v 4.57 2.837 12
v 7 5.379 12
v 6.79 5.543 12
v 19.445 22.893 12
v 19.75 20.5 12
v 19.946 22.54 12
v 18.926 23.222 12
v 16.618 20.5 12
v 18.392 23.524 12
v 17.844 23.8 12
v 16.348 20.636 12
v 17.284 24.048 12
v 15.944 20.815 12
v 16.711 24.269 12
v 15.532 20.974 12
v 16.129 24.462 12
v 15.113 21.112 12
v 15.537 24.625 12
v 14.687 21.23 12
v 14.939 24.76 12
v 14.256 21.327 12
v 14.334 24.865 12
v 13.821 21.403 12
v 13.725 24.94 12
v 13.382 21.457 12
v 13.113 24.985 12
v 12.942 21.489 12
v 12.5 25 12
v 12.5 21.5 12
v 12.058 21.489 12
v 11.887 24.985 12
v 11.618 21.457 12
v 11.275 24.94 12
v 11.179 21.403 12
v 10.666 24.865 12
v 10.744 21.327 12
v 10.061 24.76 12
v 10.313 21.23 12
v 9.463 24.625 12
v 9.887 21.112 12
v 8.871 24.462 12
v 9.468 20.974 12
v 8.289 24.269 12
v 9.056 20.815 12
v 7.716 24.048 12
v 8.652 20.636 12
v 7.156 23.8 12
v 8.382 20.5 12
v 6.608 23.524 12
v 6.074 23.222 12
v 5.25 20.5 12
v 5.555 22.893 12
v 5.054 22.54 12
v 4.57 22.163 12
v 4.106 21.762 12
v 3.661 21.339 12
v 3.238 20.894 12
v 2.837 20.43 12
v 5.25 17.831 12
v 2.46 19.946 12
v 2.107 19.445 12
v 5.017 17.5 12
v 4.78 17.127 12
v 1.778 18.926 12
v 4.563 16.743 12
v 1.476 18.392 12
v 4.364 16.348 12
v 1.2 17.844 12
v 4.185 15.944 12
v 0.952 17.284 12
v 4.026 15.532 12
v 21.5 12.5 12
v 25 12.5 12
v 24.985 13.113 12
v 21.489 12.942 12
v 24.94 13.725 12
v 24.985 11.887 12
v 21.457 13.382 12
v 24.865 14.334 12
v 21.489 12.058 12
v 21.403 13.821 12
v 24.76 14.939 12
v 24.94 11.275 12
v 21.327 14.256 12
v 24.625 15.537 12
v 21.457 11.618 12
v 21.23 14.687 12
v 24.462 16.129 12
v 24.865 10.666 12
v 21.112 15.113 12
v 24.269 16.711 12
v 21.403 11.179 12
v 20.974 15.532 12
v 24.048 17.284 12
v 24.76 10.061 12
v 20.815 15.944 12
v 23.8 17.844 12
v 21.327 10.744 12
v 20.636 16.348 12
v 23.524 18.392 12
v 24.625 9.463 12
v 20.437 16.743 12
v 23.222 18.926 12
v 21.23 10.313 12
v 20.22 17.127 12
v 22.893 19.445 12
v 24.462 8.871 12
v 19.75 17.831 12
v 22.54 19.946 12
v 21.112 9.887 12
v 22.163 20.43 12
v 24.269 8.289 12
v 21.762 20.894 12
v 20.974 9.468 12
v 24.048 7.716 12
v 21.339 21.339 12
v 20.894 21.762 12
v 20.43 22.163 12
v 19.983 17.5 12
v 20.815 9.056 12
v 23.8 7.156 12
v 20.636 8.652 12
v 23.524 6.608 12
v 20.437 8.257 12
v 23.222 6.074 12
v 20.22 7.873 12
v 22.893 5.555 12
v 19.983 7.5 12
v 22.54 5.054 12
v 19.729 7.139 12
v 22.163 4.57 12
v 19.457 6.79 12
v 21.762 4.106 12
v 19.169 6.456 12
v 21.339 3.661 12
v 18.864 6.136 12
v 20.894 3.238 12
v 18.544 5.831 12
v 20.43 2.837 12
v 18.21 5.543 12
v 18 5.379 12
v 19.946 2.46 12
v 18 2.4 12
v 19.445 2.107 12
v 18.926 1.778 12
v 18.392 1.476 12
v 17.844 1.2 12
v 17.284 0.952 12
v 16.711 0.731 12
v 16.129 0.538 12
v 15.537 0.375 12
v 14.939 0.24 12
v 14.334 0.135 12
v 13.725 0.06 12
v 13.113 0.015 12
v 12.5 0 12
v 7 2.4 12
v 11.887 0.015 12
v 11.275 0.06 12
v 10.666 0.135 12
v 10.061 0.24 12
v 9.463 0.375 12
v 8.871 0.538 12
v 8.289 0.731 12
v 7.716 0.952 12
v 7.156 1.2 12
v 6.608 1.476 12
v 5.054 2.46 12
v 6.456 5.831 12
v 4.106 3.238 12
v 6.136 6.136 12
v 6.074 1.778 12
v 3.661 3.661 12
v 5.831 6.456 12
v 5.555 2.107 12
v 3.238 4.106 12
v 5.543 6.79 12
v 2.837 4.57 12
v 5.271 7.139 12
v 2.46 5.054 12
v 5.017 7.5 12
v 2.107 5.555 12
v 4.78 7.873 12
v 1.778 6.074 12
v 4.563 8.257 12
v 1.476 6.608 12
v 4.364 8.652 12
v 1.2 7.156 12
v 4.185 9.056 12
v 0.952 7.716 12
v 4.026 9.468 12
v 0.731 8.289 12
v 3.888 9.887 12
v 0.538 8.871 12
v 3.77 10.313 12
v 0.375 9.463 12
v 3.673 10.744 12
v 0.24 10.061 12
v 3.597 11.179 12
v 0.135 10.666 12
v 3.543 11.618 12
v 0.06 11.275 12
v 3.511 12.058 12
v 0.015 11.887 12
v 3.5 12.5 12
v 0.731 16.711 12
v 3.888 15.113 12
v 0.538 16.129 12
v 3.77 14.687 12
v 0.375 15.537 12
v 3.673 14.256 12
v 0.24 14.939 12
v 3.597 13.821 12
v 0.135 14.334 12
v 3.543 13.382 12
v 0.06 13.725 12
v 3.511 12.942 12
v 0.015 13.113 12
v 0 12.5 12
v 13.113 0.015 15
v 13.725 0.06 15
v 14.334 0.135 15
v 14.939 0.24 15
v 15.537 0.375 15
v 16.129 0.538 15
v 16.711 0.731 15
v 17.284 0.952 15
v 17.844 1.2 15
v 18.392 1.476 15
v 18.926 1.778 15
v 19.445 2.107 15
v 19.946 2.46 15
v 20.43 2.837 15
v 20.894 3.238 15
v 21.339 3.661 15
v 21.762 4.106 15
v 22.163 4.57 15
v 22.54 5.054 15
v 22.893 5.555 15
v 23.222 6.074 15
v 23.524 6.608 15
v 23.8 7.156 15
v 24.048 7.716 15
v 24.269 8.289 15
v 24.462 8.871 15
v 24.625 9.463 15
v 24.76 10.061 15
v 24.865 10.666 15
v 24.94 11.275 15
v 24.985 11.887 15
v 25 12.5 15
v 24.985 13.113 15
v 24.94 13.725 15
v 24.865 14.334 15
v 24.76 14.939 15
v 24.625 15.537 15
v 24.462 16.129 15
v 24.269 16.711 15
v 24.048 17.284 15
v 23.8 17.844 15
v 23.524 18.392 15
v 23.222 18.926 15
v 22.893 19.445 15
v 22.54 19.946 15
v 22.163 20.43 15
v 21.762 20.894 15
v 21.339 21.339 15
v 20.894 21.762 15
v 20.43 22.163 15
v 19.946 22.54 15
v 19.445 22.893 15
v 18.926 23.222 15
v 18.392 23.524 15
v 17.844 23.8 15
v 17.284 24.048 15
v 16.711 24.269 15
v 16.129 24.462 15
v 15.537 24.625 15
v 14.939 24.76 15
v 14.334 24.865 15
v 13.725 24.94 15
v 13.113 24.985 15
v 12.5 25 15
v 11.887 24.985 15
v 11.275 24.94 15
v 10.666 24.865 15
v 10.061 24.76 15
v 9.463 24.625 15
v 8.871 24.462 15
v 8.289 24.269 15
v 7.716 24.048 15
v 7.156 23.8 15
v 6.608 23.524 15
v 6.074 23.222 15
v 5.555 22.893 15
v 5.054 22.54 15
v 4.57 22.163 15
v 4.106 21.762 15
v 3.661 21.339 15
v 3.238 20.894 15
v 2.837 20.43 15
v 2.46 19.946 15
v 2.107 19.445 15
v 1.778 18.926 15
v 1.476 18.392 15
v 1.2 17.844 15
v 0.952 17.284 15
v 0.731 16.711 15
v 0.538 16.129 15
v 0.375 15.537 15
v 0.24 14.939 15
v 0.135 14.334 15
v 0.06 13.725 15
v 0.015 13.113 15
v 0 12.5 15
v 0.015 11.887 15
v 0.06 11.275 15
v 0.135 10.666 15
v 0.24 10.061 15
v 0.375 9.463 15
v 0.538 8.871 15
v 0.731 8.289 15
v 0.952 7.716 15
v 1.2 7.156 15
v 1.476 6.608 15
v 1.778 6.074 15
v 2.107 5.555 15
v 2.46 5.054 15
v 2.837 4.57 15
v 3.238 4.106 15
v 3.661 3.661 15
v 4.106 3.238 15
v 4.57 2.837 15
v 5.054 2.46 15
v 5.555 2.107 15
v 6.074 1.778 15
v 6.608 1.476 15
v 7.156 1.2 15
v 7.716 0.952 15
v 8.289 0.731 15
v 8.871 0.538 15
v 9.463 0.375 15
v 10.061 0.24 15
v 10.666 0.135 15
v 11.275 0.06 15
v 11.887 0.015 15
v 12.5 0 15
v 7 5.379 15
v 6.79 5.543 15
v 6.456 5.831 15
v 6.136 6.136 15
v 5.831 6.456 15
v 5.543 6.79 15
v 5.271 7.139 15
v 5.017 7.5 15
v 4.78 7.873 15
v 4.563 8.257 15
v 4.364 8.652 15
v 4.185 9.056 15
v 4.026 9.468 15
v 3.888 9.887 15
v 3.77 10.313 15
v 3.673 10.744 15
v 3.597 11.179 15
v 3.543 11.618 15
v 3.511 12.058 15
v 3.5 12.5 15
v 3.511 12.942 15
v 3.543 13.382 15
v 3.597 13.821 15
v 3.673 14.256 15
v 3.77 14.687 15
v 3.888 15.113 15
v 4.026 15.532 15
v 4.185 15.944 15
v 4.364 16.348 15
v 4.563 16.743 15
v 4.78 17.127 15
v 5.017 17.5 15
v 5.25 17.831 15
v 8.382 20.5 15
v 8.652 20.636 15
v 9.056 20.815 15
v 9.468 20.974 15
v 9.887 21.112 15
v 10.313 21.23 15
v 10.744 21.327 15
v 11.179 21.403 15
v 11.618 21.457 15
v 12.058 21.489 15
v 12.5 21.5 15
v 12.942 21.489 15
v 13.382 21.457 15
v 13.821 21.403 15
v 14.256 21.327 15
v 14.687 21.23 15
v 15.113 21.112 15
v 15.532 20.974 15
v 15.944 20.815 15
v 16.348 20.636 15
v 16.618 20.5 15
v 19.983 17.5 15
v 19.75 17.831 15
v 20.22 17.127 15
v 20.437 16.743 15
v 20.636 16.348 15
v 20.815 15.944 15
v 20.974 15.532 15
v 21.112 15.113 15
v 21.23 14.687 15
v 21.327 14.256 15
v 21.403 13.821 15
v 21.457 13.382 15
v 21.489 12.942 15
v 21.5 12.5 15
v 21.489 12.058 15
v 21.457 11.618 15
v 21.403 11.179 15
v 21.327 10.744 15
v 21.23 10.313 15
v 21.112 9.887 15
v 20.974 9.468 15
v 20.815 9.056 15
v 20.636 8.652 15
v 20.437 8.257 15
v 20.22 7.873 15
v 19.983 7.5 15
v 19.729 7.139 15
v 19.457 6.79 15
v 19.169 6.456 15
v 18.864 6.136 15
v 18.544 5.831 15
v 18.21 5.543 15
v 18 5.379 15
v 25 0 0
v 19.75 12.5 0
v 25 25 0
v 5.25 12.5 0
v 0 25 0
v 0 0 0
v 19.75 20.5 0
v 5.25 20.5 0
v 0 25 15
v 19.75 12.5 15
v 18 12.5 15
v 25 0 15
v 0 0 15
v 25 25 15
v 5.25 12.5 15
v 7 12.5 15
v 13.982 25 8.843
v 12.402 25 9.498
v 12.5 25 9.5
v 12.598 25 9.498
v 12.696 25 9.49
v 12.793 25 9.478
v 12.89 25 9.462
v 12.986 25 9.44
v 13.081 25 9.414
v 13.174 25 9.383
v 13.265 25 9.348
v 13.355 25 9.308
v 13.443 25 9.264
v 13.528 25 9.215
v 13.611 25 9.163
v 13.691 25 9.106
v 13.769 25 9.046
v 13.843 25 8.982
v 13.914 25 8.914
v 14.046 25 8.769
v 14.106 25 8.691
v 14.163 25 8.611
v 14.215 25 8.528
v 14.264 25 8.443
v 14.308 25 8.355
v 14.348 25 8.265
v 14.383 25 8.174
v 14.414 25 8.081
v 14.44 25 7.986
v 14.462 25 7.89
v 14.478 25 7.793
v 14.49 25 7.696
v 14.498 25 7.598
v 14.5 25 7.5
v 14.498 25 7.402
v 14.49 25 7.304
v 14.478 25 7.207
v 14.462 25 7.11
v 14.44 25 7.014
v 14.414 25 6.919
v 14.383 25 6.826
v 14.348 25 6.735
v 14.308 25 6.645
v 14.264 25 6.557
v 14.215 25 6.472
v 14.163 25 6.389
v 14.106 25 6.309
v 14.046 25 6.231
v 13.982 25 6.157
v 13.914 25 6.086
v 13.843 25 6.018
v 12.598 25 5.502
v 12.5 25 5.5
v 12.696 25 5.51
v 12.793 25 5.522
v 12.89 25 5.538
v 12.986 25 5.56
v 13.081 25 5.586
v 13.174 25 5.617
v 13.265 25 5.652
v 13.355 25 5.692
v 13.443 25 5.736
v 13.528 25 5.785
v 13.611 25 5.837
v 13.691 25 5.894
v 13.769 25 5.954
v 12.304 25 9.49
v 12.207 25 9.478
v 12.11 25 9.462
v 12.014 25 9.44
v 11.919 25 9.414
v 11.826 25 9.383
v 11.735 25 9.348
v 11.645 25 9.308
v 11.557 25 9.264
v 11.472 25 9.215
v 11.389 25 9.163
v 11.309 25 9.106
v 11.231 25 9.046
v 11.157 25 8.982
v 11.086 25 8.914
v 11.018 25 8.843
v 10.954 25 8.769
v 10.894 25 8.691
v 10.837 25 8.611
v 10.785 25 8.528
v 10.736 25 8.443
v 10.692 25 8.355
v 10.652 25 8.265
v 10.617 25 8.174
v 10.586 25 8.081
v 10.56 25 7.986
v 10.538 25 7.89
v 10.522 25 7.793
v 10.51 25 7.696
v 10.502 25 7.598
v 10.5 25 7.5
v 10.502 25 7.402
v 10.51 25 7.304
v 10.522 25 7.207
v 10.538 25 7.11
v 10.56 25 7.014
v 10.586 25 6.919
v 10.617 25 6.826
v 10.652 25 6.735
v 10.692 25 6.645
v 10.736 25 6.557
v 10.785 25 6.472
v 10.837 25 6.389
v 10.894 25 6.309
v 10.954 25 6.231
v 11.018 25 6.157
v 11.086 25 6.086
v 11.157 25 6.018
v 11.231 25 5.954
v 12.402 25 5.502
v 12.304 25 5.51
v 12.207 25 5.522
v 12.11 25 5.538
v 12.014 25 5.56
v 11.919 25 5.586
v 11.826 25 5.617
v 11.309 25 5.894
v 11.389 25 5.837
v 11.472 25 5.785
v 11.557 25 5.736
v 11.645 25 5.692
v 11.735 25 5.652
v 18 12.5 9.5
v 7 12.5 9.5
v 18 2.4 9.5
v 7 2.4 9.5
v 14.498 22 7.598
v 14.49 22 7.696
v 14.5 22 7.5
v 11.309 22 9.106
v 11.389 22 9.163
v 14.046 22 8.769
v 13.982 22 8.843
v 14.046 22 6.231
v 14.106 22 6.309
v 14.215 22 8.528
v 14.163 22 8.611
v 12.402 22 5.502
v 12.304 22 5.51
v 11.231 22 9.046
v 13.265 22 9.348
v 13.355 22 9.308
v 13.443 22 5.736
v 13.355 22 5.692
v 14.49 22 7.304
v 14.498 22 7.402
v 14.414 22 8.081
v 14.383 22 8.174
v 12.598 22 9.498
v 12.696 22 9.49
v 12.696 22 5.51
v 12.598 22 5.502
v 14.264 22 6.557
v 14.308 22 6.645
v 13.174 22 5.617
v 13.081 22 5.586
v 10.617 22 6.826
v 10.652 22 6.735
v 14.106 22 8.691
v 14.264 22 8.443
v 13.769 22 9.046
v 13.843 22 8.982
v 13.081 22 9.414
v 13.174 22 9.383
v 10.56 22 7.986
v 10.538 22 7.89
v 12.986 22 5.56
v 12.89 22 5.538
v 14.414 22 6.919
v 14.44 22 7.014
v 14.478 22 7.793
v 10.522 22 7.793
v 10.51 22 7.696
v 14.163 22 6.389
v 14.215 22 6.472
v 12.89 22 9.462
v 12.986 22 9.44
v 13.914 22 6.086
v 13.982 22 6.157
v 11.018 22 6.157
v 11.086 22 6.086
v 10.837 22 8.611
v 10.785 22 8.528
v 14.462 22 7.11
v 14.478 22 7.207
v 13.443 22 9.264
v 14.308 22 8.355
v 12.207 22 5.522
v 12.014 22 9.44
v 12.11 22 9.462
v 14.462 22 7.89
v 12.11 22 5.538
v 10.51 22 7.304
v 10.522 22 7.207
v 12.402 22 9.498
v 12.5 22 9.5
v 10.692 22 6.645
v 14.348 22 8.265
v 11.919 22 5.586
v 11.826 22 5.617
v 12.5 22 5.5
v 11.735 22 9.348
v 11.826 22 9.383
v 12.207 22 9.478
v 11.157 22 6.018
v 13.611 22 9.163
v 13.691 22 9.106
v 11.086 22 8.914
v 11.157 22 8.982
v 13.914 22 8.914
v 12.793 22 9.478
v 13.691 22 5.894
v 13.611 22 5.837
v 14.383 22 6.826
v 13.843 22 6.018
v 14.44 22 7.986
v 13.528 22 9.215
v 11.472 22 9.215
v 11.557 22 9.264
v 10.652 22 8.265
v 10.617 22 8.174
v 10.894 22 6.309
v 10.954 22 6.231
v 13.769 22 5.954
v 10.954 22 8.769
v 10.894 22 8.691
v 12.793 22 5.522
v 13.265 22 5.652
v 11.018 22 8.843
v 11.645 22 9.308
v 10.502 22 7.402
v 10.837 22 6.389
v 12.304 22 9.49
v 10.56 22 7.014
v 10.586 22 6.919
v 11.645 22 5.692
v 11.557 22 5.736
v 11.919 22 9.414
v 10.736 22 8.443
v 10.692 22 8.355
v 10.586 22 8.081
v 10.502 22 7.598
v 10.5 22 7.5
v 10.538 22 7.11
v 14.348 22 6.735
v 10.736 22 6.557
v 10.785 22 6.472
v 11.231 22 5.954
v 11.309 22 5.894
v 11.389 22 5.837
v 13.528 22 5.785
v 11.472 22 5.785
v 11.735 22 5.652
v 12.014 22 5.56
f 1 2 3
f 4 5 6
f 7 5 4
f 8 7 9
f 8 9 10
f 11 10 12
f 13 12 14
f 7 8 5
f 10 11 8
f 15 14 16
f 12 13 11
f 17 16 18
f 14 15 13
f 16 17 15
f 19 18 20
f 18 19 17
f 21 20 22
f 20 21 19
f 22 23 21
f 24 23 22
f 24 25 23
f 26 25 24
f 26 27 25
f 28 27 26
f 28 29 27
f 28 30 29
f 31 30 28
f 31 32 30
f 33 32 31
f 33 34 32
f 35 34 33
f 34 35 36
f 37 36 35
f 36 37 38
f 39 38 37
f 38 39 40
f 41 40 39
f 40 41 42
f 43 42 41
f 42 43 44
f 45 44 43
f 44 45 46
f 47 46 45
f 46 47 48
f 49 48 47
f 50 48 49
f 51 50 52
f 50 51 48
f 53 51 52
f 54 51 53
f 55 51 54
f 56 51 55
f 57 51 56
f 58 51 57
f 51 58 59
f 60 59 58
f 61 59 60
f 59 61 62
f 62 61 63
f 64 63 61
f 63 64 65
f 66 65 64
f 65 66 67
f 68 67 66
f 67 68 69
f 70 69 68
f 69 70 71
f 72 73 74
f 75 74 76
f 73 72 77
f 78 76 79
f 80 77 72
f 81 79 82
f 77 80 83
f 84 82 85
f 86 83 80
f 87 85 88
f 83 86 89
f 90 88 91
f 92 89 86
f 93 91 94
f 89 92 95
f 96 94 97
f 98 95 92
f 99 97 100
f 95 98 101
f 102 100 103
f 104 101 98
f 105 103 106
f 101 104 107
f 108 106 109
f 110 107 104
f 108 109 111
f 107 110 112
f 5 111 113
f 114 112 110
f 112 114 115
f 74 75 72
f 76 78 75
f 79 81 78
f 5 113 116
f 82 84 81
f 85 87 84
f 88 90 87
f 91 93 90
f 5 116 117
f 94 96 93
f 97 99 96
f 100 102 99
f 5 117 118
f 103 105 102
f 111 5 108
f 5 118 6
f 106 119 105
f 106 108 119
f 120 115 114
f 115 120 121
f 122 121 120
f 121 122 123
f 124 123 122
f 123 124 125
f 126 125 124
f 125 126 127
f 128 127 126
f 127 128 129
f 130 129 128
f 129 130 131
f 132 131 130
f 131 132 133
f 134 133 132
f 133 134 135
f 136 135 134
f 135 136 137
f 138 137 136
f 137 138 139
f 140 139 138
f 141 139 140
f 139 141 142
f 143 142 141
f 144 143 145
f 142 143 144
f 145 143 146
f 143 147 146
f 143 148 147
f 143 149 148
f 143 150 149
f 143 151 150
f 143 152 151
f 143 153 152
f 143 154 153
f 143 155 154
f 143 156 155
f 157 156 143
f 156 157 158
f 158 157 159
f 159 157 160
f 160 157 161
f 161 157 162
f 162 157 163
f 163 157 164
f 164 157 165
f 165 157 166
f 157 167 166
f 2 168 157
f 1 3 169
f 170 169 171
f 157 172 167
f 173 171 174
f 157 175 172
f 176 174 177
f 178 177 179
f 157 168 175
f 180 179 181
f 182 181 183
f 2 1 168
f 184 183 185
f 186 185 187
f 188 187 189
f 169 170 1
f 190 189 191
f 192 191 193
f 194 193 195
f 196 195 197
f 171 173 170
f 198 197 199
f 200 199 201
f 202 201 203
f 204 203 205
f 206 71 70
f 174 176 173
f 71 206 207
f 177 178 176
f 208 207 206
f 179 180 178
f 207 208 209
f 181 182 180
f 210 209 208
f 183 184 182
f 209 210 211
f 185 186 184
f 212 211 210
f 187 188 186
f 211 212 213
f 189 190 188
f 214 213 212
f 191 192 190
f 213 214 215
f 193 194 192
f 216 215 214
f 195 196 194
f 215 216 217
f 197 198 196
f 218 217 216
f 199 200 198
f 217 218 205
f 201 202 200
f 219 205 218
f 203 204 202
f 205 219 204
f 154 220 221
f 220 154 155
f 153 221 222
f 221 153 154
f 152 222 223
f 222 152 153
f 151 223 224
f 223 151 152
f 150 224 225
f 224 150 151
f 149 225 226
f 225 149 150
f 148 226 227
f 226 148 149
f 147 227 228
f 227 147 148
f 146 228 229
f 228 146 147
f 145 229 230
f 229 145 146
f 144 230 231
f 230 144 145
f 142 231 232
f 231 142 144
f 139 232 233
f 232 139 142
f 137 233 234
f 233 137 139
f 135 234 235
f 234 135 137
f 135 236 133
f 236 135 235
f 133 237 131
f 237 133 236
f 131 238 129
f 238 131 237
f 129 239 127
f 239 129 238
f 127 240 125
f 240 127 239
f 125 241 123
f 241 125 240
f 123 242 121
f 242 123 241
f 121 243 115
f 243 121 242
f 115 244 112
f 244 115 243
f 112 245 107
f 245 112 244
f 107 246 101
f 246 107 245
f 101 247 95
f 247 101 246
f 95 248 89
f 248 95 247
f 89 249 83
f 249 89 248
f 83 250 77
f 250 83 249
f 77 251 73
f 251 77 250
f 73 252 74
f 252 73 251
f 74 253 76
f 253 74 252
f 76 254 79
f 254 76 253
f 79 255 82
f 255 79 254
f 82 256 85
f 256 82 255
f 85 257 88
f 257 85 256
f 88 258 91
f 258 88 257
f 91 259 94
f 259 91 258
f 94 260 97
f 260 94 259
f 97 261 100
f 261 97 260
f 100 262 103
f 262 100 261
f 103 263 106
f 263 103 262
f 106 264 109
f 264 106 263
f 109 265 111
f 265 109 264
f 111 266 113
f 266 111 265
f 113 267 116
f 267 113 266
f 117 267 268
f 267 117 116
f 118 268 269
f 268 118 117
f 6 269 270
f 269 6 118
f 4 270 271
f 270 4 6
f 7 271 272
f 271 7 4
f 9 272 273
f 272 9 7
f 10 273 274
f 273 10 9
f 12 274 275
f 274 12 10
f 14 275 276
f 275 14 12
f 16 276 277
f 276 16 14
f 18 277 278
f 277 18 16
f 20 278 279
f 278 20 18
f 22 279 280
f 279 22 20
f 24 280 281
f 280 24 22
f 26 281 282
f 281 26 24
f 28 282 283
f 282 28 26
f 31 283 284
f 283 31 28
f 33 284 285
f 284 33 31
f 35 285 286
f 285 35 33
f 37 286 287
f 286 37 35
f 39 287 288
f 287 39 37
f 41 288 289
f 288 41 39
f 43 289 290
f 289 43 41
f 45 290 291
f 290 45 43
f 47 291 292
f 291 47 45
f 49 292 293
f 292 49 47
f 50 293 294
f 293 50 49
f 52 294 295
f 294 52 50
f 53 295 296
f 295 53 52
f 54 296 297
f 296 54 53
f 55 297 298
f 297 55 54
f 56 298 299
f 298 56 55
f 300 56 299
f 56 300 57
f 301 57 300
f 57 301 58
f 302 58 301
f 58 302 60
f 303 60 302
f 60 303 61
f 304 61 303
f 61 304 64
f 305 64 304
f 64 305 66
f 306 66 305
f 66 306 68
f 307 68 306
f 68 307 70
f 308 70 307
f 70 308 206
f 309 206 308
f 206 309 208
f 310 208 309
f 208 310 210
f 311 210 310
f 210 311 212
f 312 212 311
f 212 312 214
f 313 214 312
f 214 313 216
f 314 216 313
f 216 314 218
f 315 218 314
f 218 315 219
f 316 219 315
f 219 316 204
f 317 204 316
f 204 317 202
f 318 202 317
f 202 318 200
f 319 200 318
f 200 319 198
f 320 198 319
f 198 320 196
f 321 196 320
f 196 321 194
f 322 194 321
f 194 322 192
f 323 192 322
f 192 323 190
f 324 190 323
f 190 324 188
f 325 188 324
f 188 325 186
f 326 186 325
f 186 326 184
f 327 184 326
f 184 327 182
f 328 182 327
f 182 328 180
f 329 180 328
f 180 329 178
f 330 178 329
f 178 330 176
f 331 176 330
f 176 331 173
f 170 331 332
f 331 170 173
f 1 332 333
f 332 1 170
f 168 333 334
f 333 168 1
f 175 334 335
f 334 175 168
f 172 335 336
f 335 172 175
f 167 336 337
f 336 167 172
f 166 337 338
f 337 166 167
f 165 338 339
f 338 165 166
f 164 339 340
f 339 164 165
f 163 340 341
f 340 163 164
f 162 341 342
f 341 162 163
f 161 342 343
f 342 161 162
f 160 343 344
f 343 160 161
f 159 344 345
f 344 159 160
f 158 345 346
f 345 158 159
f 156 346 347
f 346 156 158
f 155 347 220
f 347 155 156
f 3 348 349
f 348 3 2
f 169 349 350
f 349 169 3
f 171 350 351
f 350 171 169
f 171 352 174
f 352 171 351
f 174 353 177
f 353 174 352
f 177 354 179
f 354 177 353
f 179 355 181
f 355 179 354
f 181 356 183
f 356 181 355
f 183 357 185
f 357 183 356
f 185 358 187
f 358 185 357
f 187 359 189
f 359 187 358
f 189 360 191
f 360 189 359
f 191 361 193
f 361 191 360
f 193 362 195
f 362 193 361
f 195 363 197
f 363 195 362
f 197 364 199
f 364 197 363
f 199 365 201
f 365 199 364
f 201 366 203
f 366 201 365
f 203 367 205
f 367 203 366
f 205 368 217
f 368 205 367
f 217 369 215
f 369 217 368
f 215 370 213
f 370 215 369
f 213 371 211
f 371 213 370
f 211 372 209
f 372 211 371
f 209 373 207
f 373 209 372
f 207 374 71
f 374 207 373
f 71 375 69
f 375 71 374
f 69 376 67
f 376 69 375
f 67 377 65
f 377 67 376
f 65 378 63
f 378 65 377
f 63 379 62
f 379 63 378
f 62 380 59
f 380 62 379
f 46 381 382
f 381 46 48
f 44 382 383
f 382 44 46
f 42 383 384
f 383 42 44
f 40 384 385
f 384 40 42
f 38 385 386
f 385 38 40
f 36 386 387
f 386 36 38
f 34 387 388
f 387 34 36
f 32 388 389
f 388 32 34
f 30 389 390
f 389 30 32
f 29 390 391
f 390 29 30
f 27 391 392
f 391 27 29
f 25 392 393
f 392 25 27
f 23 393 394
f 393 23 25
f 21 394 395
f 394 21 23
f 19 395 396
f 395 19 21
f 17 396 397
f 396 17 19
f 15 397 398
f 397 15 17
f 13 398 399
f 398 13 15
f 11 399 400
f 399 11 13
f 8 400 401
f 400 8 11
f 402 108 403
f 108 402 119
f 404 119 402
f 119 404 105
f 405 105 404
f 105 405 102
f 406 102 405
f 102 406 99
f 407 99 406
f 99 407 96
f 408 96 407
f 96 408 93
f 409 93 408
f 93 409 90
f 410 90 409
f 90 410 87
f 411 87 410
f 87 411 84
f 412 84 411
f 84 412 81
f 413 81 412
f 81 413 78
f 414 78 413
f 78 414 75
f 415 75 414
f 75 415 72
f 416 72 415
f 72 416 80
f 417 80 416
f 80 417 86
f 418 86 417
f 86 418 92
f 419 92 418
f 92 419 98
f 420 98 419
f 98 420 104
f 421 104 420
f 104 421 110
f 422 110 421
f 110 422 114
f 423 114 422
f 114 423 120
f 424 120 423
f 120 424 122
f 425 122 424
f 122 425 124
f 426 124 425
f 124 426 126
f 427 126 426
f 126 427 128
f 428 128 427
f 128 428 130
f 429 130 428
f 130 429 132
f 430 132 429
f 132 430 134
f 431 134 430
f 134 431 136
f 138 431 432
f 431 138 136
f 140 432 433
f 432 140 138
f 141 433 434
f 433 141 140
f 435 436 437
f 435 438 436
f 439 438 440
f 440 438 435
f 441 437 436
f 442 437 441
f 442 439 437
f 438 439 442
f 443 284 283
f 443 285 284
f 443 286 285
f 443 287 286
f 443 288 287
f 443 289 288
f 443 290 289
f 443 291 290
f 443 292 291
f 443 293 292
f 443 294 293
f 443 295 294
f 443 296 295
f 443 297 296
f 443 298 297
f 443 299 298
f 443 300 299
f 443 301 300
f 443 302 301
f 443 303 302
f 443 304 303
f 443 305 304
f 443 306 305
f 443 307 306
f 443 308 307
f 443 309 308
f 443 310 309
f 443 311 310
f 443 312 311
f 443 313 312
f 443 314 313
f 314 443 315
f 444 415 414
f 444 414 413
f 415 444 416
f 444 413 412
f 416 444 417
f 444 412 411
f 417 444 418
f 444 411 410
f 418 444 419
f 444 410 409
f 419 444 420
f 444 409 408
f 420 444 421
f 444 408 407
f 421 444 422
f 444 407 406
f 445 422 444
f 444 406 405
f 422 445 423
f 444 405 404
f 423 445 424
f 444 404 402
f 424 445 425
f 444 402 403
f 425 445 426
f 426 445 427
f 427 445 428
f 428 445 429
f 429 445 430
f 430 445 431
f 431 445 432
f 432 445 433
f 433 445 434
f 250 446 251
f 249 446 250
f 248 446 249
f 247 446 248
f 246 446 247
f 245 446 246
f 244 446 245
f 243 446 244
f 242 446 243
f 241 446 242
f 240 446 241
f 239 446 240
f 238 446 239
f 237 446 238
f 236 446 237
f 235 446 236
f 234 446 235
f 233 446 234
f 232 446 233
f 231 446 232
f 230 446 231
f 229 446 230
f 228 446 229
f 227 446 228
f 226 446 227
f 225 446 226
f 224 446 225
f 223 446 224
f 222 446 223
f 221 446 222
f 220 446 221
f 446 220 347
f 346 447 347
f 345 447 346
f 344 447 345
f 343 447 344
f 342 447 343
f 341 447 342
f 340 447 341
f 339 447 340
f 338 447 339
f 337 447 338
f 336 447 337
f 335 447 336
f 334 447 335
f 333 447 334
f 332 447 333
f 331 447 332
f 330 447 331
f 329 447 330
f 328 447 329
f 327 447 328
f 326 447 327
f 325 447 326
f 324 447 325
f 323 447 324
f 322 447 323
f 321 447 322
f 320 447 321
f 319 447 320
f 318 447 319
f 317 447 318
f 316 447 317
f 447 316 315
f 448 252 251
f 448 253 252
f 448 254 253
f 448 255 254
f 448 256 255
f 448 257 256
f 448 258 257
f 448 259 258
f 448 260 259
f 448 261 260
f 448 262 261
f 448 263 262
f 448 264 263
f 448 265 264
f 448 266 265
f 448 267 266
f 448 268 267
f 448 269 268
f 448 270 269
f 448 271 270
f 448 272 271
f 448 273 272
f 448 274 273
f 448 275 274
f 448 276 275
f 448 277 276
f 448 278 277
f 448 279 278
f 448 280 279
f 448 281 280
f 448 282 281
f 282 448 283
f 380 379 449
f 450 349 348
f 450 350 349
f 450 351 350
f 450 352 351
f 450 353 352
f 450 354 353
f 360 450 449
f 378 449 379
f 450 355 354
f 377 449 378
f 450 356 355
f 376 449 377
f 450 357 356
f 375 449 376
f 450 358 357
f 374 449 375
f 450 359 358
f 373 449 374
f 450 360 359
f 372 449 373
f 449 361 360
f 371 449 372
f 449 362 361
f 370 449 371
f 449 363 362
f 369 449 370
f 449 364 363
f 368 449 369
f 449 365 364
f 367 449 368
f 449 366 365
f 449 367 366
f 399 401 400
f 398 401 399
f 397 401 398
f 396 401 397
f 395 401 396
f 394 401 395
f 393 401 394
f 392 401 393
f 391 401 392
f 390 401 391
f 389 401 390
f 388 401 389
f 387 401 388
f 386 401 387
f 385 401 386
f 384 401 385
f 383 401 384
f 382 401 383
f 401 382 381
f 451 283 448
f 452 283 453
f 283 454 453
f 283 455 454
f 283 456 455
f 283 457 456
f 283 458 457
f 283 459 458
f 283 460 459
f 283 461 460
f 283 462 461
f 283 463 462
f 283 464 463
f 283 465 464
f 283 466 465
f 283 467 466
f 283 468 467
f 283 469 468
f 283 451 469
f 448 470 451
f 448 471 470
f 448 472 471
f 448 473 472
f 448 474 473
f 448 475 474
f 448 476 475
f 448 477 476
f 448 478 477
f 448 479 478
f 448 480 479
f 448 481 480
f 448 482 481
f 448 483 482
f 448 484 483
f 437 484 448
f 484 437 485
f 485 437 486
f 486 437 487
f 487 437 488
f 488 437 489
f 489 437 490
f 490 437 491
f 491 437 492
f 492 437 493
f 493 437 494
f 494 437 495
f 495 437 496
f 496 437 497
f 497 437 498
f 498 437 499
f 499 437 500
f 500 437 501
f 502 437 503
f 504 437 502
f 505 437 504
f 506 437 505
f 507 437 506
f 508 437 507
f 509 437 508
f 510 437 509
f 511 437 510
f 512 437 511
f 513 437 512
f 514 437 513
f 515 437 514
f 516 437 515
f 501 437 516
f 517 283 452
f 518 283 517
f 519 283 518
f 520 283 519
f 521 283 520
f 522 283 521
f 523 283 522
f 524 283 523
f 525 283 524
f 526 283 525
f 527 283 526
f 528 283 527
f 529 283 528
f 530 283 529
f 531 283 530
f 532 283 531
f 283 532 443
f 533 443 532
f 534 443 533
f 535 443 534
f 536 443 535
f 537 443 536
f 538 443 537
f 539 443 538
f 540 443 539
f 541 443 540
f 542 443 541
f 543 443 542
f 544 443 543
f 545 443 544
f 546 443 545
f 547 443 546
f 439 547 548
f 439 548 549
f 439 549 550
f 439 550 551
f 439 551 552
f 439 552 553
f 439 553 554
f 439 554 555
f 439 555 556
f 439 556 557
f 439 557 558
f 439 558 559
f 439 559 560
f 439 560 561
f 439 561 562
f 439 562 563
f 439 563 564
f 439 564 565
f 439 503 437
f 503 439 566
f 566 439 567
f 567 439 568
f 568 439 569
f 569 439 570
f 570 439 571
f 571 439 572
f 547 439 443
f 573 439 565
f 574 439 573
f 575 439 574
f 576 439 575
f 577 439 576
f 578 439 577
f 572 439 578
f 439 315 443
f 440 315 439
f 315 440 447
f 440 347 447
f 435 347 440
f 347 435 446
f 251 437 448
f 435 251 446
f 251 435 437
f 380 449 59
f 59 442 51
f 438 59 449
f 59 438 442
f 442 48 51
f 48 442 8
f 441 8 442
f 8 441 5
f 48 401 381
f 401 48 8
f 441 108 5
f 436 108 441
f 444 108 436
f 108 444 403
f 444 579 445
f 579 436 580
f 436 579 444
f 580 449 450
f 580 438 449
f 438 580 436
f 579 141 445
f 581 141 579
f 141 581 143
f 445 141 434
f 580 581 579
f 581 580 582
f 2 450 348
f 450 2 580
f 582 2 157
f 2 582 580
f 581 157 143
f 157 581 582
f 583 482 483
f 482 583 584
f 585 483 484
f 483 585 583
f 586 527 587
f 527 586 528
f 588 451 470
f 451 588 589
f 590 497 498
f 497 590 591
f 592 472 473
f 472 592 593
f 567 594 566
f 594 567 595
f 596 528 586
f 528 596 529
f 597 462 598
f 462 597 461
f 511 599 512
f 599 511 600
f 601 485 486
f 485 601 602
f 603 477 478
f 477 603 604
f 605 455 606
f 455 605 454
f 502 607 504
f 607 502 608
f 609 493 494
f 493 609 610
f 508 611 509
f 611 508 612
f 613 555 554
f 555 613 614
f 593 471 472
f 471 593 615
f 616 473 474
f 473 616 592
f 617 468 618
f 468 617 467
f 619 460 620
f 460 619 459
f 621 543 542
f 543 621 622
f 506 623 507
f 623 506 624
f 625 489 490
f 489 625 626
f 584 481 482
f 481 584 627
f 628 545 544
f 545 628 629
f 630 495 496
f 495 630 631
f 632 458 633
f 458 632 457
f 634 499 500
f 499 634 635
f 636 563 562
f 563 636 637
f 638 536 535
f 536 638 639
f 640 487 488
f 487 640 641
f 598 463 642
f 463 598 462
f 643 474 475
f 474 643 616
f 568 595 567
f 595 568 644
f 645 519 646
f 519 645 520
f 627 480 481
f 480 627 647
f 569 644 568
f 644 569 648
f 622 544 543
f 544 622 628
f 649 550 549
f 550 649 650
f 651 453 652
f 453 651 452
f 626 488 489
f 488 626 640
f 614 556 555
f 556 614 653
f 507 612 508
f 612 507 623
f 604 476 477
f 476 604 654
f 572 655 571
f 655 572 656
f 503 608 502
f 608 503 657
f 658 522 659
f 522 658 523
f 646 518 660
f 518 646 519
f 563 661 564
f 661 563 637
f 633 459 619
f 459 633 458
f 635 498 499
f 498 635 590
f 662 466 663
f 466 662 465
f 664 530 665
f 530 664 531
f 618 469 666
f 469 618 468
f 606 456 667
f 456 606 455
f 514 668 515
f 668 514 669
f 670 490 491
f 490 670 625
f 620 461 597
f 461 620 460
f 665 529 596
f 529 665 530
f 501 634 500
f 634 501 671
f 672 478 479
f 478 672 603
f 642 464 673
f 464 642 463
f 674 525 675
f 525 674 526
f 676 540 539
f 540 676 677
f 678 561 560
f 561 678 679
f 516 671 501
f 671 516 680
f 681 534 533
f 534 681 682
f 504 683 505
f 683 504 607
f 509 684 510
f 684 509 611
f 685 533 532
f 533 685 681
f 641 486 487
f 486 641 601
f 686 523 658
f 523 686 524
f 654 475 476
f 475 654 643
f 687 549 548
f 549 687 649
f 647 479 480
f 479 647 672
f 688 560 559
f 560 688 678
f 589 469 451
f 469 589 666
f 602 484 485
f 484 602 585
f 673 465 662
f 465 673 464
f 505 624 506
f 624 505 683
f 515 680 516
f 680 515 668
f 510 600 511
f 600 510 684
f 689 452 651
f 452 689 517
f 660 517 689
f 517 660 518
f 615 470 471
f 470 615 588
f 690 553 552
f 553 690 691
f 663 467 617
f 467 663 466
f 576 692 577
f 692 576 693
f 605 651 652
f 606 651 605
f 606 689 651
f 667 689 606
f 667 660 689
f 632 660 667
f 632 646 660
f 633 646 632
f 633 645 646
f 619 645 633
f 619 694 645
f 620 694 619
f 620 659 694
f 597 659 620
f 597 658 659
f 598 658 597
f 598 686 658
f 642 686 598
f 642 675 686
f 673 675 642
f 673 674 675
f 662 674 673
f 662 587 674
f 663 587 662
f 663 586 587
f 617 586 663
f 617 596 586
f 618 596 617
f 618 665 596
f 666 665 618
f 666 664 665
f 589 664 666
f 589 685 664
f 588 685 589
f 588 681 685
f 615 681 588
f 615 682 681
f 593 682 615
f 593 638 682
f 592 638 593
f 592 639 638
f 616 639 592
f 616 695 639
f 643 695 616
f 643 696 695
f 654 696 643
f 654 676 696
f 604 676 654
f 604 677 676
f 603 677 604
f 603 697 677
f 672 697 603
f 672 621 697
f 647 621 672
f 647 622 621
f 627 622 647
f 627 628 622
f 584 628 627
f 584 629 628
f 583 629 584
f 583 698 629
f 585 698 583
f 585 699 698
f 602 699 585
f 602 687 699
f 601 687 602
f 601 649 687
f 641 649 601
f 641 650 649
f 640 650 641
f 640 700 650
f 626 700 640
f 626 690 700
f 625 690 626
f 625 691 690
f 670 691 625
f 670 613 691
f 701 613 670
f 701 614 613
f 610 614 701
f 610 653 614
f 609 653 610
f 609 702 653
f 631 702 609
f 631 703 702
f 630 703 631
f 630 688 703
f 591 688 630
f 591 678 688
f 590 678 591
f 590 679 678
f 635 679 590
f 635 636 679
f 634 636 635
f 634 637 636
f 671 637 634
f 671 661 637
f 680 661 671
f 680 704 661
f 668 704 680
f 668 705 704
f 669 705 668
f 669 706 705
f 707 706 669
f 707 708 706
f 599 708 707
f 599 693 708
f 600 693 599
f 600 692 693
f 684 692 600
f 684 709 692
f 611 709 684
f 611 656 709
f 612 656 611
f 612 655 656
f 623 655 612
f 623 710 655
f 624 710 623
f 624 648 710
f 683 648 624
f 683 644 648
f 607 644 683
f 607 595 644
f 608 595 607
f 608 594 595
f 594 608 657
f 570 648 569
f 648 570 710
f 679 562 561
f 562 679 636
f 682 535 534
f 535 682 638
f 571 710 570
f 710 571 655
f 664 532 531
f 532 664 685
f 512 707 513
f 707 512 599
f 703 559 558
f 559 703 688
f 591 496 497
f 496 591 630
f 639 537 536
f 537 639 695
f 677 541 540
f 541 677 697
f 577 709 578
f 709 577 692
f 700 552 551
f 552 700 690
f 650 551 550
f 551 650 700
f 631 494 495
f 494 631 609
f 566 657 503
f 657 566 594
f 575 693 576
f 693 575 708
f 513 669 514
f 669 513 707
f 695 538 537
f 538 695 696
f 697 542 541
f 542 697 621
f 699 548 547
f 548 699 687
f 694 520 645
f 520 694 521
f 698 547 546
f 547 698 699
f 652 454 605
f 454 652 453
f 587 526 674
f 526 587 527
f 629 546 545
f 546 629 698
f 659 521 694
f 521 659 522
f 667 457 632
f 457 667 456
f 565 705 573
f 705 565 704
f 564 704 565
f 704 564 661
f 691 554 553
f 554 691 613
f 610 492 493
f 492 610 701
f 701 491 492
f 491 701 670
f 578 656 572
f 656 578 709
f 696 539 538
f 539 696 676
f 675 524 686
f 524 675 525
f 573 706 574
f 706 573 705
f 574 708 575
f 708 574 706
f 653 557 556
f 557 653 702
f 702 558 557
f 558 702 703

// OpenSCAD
// file: pinhole_insert.scad
include <config.scad>
module pinhole_insert() {
    difference() {
        linear_extrude(pinhole_insert_height) difference() {
            circle(radius_pinhole);
            circle(radius_pinhole - pinhole_insert_thickness);
        }
        
        translate([radius_pinhole - pinhole_insert_thickness * 1.5, 0, pinhole_insert_height / 2]) rotate([0, 90, 0])
            cylinder(pinhole_insert_thickness * 2, 2, 2);
    }
}

pinhole_insert();
// file: config.scad
$fn = 128;


module hexagon(width) {
	diagonal = width * tan(30) + (width / 2) / cos(30);
	polygon(points = [
		[0, diagonal / 2],
		[width / 2,  width * tan(30) / 2],
		[width / 2, -width * tan(30) / 2],
		[0, -diagonal / 2],
		[-width / 2, -width * tan(30) / 2],
		[-width / 2,  width * tan(30) / 2],
	]);
}

switch_width = 14.5;
switch_height = 8;

bolt_hole_radius = 2.05;

bolt_hex_width = 8.3;
bolt_hex_length = 20;
bolt_mount_thickness = 3; 
bolt_mount_width = bolt_hex_width + bolt_mount_thickness * 2;
bolt_cap = 3;

laser_inset = 10;

radius_pinhole = 12.5;
pinhole_insert_thickness = 3.5;
pinhole_insert_height = 15;
pinhole_insert_insert_depth = 3;

led_mount_thickness = 15;
led_board_thickness = 5.5;
led_board_width = 11;
led_board_height = 16;

bolt_insert_radius = led_mount_thickness / 3 - pinhole_insert_insert_depth;
bolt_insert_depth = 3;
// main file
include <config.scad>
use <pinhole_insert.scad>

module led_mount() {
    difference() {
        linear_extrude(led_mount_thickness) difference() {
            square(2 * radius_pinhole);
            translate([radius_pinhole - switch_width / 2, radius_pinhole]) square([switch_width, switch_height]);
        }
        
        translate([radius_pinhole - led_board_width / 2, radius_pinhole - led_board_height + switch_height - 2.1, led_mount_thickness - led_board_thickness]) 
            cube([led_board_width, led_board_height, led_board_thickness]);
            
        translate([radius_pinhole, radius_pinhole, led_mount_thickness - pinhole_insert_insert_depth])
            pinhole_insert();
            
        translate([radius_pinhole, radius_pinhole * 2, led_mount_thickness / 2]) rotate([90, 0, 0]) cylinder(bolt_insert_depth, bolt_insert_radius, bolt_insert_radius);
    }
}

led_mount();
